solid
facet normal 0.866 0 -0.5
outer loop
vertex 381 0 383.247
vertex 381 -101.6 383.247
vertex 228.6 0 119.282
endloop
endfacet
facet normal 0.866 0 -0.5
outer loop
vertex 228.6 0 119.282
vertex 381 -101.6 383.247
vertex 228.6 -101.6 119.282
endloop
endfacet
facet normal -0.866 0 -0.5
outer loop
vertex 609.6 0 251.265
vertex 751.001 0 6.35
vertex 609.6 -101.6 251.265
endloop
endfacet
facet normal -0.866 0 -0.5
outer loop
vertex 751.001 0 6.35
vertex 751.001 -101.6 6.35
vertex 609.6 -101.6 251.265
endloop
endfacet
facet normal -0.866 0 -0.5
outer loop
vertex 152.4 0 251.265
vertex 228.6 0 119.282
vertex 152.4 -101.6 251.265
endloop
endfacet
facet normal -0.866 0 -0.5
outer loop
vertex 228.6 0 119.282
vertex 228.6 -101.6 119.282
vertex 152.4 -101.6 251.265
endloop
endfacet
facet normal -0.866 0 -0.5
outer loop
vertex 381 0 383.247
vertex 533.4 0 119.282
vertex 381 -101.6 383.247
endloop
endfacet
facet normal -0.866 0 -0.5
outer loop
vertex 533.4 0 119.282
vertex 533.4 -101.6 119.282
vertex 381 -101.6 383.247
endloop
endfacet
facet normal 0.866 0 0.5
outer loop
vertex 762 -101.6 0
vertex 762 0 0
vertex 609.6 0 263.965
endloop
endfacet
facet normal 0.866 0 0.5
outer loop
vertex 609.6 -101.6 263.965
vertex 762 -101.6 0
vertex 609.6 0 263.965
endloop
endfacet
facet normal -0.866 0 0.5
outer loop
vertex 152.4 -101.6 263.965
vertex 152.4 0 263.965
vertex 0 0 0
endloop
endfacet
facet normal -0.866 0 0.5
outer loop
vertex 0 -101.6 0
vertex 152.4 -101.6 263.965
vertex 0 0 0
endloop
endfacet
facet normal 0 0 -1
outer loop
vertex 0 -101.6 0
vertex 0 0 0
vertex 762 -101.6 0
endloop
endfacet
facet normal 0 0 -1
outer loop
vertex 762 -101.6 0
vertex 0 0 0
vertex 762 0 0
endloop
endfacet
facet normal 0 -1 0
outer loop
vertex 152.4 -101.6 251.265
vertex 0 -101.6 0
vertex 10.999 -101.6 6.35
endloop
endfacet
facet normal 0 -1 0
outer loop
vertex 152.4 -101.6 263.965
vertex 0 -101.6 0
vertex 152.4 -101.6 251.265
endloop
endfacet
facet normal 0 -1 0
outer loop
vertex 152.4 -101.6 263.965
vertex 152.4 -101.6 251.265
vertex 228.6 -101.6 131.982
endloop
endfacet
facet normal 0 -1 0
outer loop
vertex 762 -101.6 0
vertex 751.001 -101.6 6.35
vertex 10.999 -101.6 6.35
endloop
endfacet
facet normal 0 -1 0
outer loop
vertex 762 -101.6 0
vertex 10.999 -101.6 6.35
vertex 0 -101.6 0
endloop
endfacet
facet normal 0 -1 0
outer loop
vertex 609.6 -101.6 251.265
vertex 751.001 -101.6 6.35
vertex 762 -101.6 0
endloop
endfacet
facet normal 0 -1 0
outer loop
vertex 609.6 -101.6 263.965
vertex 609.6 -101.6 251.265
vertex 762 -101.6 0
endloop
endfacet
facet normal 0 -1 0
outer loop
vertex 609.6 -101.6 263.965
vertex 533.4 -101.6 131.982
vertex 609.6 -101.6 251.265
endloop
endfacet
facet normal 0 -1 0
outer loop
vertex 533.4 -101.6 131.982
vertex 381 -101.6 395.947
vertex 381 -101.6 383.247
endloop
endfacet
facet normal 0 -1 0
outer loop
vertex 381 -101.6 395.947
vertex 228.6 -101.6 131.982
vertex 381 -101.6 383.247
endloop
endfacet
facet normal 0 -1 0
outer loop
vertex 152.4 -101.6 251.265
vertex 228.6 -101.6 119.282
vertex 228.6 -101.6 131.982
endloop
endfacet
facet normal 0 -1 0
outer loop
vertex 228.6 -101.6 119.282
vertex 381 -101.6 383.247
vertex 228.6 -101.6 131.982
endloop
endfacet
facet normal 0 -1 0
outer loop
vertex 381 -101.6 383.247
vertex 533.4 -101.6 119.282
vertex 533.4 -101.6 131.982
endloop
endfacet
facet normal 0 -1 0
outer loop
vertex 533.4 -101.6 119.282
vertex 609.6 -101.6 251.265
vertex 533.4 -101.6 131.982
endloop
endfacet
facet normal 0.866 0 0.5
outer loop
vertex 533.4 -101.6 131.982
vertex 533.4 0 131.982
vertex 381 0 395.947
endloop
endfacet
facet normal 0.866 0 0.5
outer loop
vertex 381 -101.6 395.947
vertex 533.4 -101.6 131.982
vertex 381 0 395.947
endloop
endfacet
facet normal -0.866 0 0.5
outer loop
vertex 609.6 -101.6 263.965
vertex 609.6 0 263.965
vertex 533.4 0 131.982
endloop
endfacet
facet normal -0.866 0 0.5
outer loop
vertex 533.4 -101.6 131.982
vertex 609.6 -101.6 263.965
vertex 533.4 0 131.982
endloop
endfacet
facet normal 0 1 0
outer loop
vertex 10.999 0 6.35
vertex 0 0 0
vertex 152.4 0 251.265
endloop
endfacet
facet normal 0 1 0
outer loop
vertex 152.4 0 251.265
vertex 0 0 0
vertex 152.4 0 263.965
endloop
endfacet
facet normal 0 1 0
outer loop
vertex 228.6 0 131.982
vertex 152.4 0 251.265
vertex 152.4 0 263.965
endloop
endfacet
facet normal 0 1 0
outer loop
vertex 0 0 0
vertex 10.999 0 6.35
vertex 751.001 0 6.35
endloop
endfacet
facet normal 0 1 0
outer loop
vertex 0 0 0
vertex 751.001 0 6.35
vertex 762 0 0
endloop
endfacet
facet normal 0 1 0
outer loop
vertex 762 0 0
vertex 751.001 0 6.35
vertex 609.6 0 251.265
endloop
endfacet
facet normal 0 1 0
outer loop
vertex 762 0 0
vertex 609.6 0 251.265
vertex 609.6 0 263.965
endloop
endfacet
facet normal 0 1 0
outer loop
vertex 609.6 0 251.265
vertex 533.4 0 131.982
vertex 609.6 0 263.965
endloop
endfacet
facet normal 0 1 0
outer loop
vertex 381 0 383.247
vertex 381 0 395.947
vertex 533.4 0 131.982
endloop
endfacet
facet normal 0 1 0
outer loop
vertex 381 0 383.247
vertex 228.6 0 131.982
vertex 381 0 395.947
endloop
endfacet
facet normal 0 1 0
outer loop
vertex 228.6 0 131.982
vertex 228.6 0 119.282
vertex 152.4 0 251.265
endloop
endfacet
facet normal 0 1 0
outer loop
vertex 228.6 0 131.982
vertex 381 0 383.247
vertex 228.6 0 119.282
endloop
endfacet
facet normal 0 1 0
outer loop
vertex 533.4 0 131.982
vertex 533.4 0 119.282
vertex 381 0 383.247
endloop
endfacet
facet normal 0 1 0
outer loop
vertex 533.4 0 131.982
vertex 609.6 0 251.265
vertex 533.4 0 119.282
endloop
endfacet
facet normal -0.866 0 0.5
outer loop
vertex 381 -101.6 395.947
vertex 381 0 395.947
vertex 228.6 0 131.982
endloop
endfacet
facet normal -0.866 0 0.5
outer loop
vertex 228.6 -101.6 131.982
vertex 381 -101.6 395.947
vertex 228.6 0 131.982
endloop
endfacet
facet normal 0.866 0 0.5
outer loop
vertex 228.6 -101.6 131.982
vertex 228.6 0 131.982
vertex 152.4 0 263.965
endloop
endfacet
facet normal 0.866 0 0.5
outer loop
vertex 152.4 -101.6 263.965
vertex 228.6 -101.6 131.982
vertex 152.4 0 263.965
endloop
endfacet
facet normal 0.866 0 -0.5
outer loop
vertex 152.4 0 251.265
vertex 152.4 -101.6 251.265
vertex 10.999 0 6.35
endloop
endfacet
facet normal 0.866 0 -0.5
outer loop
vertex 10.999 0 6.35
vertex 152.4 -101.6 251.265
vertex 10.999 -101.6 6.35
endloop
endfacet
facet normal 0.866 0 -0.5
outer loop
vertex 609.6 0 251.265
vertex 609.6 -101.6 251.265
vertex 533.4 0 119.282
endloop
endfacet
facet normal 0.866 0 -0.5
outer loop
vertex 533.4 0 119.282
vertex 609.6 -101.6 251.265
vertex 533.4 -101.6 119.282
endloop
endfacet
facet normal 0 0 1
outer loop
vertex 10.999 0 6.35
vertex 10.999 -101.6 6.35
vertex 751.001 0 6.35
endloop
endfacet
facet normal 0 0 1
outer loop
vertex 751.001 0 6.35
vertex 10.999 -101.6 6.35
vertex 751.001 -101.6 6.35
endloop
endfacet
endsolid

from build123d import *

# Parameters (mm, degrees)
F1_DEPTH = 101.6
F2_T     = -6.35
F4_DEPTH = 6.35


with BuildPart() as f1:
    # F0 (on Front) → F1 (new body)
    with BuildSketch(Plane.XZ):
        Polygon((152.4, 263.9645430735), (0, 0), (762, 0), (609.6, 263.9645430735), (533.4, 131.9822715367), (381, 395.9468146102), (228.6, 131.9822715367), align=None)
    extrude(amount=F1_DEPTH)

    # F2
    f2_openings = [f1.faces().sort_by_distance(p)[0] for p in [
        (381, -101.6, 120.250514),
    ]]
    offset(amount=F2_T, openings=f2_openings, kind=Kind.INTERSECTION)

    # F3 (on face) → F4 (cut)
    with BuildSketch(Plane.XZ.offset(6.35)):
        Polygon((152.4, 251.2645430735), (10.9985226281, 6.35), (751.0014773719, 6.35), (609.6, 251.2645430735), (533.4, 119.2822715367), (381, 383.2468146102), (228.6, 119.2822715367), align=None)
    extrude(amount=-F4_DEPTH, mode=Mode.SUBTRACT)


solid = f1.part
